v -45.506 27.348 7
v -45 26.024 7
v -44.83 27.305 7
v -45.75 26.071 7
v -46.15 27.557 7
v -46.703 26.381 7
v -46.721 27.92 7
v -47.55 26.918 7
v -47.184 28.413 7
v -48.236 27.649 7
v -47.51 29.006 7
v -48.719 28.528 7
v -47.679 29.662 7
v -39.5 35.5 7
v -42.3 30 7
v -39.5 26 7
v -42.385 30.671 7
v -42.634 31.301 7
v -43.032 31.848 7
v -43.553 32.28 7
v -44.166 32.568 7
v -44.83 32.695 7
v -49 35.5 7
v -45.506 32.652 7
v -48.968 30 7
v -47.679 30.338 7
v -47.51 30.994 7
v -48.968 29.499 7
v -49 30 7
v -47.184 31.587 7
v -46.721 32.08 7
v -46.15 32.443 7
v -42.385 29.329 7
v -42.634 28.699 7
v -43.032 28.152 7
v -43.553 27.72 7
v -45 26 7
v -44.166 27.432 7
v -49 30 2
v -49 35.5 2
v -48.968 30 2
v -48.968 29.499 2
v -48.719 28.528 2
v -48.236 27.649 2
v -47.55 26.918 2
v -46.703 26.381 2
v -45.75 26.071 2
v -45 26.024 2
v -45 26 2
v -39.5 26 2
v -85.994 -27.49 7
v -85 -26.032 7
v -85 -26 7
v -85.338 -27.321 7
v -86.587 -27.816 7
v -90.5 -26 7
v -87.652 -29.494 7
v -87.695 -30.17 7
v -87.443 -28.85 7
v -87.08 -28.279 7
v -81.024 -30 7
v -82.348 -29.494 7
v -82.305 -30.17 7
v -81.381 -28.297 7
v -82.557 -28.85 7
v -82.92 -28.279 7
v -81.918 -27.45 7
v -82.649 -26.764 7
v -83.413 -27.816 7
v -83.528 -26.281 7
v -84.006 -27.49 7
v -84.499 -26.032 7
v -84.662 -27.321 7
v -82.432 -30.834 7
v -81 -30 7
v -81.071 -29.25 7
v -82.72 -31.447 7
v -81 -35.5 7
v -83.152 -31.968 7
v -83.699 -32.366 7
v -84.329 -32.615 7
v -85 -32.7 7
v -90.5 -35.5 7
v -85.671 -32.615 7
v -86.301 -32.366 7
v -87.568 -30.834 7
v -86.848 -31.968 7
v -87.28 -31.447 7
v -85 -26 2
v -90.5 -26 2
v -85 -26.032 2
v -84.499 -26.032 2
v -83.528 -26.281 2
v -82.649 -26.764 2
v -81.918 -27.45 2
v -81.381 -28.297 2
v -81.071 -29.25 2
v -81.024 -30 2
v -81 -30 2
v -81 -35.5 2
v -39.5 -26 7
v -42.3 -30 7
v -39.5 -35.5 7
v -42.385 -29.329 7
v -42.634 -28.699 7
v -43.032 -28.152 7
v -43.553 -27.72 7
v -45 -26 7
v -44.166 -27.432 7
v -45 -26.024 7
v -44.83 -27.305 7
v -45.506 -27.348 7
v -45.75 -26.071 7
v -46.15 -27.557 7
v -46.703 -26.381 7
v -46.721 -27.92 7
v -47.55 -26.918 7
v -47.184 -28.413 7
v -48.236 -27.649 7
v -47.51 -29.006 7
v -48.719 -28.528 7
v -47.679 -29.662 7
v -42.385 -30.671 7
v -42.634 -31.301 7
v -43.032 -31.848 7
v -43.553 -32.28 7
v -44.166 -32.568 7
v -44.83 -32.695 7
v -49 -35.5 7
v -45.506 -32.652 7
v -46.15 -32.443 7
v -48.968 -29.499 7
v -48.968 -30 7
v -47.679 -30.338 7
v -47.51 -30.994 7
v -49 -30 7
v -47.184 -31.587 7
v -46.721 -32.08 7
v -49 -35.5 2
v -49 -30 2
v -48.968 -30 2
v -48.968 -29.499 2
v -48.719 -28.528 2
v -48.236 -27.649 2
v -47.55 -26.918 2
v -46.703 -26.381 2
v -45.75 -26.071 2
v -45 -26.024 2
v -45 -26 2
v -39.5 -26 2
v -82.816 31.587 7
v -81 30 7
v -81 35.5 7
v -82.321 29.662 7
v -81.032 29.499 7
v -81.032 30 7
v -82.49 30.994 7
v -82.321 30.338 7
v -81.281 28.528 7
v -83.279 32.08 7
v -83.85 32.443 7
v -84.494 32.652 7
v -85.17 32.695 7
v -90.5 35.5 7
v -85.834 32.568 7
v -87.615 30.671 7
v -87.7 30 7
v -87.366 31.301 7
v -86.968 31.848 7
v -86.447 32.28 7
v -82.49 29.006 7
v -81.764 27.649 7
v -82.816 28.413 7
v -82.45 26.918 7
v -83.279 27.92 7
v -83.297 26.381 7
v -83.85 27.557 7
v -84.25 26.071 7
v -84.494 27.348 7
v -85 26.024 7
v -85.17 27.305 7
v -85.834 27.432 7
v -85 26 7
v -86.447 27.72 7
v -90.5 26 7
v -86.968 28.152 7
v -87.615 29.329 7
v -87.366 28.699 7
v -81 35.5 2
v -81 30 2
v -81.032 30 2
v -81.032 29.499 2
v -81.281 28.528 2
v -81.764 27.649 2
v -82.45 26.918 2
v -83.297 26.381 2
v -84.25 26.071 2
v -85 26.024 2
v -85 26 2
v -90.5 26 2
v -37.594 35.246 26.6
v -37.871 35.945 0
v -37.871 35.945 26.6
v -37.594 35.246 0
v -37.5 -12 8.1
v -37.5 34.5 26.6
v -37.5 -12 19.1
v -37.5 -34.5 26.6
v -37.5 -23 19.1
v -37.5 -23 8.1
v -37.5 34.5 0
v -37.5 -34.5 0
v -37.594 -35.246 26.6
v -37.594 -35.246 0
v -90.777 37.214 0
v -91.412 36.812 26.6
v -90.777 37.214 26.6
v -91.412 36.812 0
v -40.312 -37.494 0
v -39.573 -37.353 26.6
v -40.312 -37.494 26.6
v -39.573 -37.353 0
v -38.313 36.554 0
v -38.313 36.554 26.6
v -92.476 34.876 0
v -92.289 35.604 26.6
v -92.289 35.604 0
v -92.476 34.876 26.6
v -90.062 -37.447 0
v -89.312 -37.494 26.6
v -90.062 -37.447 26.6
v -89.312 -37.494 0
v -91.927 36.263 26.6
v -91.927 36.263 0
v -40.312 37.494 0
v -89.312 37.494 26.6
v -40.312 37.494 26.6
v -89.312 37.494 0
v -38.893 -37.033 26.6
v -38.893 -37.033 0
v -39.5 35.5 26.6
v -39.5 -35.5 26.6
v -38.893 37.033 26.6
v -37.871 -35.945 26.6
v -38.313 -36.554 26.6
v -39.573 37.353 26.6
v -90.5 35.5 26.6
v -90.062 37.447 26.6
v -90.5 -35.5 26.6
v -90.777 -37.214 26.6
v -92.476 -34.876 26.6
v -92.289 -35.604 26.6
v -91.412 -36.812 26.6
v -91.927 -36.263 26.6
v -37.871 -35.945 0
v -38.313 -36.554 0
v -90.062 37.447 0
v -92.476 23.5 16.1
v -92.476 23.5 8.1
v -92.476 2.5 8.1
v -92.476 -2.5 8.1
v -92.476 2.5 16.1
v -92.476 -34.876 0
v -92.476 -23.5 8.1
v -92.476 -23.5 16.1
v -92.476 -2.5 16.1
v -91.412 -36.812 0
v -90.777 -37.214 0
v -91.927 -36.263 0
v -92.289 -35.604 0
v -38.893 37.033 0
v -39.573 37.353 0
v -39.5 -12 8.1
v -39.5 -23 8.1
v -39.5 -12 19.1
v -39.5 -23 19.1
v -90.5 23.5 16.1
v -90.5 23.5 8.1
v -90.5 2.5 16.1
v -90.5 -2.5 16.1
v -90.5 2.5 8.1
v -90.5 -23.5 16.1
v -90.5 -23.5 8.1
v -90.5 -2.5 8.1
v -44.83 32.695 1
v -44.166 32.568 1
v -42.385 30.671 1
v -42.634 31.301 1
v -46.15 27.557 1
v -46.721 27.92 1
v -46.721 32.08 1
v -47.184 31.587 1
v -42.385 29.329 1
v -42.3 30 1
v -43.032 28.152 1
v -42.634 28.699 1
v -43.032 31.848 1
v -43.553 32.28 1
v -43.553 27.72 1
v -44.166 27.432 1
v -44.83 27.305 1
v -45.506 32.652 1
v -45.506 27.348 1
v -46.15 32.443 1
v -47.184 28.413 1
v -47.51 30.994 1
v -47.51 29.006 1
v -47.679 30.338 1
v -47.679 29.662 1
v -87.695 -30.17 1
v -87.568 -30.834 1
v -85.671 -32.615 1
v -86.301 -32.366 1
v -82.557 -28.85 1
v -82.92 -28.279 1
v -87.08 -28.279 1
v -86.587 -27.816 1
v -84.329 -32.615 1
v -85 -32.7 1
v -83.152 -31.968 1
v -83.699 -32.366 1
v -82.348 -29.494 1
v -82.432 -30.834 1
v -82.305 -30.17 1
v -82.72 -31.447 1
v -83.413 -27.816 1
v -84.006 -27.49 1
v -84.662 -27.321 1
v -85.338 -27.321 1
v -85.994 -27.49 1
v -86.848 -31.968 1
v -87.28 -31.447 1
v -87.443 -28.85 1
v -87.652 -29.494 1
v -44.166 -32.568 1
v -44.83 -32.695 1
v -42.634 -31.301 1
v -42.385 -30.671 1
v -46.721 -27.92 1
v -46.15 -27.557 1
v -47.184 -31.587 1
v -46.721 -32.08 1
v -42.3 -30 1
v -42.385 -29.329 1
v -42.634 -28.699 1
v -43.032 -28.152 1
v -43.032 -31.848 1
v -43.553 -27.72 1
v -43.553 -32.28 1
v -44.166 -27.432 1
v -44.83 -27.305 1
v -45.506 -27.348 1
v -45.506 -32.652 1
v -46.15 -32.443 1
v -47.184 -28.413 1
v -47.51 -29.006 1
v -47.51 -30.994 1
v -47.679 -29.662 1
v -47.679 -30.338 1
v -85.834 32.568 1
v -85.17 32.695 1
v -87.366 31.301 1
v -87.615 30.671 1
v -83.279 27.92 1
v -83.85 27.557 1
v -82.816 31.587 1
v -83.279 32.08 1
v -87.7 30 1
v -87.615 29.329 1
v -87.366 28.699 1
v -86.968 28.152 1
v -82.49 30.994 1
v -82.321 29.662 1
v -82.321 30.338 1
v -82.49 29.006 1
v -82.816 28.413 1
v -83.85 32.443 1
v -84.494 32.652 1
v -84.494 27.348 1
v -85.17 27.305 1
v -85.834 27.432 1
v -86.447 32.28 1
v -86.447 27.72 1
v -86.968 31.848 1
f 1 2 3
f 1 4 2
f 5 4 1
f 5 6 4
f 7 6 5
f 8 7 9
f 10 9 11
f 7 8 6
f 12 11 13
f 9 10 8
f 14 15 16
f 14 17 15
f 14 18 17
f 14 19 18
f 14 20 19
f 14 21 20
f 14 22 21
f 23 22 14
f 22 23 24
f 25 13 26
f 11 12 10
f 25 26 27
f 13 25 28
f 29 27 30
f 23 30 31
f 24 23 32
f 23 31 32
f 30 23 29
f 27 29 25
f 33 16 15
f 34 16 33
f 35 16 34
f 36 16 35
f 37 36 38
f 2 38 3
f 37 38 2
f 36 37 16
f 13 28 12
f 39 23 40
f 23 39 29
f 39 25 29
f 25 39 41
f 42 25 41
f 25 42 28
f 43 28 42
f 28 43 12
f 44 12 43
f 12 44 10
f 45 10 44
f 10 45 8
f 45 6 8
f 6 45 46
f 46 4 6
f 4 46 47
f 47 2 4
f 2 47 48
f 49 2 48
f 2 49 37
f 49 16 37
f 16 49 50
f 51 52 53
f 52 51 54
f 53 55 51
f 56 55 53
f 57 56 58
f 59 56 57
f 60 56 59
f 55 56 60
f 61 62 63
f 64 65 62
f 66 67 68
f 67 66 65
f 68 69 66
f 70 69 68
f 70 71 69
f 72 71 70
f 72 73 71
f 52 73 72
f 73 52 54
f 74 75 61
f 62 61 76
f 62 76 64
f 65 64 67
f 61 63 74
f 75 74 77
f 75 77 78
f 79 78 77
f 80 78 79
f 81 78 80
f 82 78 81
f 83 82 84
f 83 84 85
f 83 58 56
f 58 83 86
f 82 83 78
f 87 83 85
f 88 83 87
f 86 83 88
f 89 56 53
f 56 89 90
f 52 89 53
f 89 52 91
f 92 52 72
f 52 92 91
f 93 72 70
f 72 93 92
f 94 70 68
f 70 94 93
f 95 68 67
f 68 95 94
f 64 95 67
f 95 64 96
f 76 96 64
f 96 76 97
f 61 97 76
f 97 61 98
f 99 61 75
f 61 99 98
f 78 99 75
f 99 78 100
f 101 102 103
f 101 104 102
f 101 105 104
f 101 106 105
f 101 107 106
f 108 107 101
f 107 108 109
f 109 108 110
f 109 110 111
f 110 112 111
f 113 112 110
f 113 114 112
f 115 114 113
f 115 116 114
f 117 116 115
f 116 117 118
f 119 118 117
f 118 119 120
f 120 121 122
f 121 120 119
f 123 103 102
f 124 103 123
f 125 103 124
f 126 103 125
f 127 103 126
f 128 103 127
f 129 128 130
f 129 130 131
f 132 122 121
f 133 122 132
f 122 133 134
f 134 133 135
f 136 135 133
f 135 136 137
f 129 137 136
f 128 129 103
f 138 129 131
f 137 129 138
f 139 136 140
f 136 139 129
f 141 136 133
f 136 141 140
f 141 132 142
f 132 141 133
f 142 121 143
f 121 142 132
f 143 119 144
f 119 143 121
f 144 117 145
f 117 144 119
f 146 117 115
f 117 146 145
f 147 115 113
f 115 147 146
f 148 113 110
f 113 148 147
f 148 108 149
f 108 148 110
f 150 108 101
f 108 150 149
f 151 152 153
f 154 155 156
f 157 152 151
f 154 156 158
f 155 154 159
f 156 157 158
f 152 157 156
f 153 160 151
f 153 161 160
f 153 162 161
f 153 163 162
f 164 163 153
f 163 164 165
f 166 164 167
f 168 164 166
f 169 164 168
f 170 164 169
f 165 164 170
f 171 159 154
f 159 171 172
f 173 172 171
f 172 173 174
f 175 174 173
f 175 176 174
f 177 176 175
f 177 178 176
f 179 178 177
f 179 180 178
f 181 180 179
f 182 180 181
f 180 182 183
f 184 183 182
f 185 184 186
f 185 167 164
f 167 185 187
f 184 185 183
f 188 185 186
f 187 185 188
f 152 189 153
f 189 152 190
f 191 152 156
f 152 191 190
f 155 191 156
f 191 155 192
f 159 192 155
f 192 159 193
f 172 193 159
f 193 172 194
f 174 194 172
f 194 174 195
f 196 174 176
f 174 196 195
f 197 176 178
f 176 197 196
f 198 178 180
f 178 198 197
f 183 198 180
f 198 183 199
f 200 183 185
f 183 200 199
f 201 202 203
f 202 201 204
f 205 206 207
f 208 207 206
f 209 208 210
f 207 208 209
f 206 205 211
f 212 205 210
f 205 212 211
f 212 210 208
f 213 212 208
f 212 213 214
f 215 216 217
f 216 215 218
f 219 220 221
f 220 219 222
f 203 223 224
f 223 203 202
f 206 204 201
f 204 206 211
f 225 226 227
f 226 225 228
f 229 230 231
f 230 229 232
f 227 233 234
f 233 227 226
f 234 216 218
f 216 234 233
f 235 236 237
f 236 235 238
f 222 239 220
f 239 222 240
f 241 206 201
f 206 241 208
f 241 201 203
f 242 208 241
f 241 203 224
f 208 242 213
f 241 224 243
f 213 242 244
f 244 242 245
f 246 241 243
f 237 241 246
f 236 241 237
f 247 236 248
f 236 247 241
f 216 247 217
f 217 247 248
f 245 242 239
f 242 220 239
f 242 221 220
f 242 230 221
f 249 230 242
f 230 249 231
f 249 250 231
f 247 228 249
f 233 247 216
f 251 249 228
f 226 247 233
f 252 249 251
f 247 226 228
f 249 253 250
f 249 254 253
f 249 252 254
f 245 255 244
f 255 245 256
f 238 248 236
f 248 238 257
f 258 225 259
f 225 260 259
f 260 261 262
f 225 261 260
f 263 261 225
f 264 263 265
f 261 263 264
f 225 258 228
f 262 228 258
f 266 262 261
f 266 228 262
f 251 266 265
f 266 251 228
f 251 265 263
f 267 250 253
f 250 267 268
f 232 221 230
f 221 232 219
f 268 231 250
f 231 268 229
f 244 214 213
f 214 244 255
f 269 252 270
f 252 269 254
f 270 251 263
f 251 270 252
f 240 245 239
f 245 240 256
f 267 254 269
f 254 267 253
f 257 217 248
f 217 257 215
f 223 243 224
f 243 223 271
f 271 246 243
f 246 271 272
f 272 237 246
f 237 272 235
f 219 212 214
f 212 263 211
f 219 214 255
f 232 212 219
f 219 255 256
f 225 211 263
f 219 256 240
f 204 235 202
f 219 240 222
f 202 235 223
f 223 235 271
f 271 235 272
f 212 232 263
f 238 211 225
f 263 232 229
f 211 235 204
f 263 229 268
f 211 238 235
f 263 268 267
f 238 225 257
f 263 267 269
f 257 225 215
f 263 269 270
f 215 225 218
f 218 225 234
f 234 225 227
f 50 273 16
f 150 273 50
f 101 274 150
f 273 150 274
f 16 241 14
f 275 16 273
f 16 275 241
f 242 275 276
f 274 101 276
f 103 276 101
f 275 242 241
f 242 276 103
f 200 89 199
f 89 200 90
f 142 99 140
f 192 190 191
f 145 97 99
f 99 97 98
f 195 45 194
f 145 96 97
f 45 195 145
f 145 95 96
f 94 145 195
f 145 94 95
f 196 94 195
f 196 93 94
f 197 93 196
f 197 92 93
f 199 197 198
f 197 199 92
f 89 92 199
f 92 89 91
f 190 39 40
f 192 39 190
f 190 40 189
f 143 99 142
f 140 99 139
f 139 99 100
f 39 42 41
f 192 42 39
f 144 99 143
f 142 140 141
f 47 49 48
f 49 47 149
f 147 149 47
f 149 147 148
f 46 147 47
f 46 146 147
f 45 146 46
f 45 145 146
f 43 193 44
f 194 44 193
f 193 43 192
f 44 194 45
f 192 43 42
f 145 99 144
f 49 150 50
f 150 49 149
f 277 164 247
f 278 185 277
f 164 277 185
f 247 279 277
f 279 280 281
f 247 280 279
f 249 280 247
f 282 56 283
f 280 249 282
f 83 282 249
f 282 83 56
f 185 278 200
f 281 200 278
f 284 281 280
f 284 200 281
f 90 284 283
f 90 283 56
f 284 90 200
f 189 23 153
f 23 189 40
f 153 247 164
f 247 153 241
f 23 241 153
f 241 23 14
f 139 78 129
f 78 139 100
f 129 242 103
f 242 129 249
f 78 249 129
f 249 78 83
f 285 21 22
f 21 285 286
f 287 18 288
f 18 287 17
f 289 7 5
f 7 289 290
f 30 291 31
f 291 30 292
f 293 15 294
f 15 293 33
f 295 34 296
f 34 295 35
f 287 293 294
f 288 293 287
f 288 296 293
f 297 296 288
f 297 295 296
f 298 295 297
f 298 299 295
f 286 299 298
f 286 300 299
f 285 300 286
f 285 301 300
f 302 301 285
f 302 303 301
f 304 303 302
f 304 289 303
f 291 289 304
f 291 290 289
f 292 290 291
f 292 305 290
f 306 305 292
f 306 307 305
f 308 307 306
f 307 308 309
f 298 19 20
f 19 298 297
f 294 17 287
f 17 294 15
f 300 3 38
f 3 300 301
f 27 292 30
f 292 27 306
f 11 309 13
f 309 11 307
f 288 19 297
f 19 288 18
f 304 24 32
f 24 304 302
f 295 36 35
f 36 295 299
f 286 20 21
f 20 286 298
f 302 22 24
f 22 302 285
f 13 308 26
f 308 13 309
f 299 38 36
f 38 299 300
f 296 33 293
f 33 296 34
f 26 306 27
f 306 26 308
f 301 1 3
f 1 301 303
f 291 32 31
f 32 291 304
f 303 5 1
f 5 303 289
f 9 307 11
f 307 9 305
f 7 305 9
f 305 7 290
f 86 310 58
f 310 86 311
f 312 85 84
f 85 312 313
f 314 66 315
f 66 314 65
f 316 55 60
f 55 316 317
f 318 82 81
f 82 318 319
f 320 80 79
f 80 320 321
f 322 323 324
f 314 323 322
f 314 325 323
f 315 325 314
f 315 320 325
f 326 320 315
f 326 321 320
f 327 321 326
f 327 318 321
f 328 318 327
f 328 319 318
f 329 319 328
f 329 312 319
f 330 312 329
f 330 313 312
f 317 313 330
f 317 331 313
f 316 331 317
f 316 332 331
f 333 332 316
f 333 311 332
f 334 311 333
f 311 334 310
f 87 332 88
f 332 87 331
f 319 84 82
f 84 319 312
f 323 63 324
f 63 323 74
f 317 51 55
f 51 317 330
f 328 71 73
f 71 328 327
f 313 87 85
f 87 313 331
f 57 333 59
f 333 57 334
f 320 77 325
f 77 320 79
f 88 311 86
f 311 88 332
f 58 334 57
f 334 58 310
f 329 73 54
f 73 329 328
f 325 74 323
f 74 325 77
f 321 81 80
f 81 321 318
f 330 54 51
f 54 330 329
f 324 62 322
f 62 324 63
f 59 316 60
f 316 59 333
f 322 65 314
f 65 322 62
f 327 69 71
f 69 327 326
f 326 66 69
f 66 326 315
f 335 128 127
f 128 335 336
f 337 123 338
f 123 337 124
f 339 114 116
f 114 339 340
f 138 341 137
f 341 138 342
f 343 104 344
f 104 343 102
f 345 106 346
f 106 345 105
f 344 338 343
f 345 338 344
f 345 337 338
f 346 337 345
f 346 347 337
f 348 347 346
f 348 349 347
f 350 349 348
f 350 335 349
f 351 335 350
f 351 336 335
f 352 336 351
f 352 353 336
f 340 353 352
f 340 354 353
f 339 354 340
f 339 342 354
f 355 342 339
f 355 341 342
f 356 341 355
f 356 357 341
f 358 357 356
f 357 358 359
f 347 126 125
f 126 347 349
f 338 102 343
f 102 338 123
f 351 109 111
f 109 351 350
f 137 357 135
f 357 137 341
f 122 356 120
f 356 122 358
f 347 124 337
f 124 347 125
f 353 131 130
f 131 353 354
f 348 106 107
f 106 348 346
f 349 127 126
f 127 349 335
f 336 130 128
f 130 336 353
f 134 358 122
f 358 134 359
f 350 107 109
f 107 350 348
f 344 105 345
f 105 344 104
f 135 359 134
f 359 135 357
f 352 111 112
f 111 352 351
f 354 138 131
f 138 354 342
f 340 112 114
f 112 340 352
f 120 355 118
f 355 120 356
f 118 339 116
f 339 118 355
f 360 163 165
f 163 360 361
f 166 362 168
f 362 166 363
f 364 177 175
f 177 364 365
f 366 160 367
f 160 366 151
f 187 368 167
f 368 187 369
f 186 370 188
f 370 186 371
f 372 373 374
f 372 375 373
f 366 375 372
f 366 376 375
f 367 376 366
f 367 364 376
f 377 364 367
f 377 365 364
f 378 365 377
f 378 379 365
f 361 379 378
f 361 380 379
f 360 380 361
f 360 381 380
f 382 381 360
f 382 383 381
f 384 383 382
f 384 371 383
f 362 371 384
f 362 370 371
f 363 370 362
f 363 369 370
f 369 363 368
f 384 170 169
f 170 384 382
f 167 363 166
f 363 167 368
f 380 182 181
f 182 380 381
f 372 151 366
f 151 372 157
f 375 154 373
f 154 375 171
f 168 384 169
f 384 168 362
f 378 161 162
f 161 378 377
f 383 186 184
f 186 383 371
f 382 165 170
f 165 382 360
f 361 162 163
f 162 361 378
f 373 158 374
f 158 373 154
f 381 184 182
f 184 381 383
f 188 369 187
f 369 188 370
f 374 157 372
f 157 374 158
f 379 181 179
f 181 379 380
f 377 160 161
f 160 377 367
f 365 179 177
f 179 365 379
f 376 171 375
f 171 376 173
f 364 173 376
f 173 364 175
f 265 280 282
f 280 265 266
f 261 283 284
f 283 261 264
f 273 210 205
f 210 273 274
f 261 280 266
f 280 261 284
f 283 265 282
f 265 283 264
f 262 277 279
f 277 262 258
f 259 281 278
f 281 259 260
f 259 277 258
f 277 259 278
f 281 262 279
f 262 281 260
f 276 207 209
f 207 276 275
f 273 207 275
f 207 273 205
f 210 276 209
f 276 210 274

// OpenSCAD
/* A small, arbitrary unit to guard against rounding errors */
eps = 0.1;
alot = 1000;

/* Base PCB size */
pcb_width = 50;
pcb_height = 70;
/* Extra space around PCB */
pcb_extra = 1;

/* Offset of screw hole centers from left/right/top/bottom side of board */
screw_offx_l = 5;
screw_offx_r = 5;
screw_offx_t = 5;
screw_offx_b = 5;

/* Thickness of bottom, walls, lid (middle sections) */
bottom_thickness = 2;
wall_thickness = 2;
lid_thickness = 2;

/* Outside corner radius */
corner_radius_wall = 3;
corner_radius_lid = 2;

screw_base_dia = 8;
screw_base_h = 5;
screw_nut_dia = 5.4;
screw_nut_h = 6;
screw_hole_dia = 3.2;
screw_hole_h = 6;
board_thickness = 1.6;
height_above_board = 18;
height_lid_inner = 2;
lid_lip_depth = 2;
lid_lip_width = 2;
lid_lip_extra = 1;

clamp_tube_dia = screw_base_dia;
clamp_tube_h = 0; //height_above_board+height_lid_inner;
clamp_tube_base_extra = 2;

screw_head_hole_dia = 6.5;
screw_head_hole_depth = 3;

module rounded_rect(w, h, r) {
    hull(){
        translate([w/2-r, h/2-r]) circle(r);
        translate([-(w/2-r), h/2-r]) circle(r);
        translate([w/2-r, -(h/2-r)]) circle(r);
        translate([-(w/2-r), -(h/2-r)]) circle(r);
    }
}

module shell(thickness, inner_height, inner_extra, radius_horiz) {
    d = thickness + inner_height;
    rh=radius_horiz;
    difference(){
        r = corner_radius_wall;
        w = pcb_width+pcb_extra+2*wall_thickness;
        h = pcb_height+pcb_extra+2*wall_thickness;
        hull() {
            translate([0, 0, rh]) linear_extrude(height=d-rh) rounded_rect(w, h, r);
            linear_extrude(height=eps) rounded_rect(w-2*rh, h-2*rh, r);
        }
        
        iw = pcb_width+inner_extra;
        ih = pcb_height+inner_extra;
        translate([-iw/2, -ih/2, bottom_thickness]) cube([iw, ih, h]);
    }
}

module single_screw_base() {
    translate([0, 0, bottom_thickness-eps]) linear_extrude(height=screw_base_h+eps) {
        circle(d=screw_base_dia);
        translate([-screw_base_dia/2, 0]) square([alot, alot]);
        translate([0, -screw_base_dia/2]) square([alot, alot]);
    }
}

w = pcb_width;
h = pcb_height;
e = pcb_extra;
l = screw_offx_l;
r = screw_offx_r;
t = screw_offx_t;
b = screw_offx_b;
s1_pos = [w/2-l, h/2-b];
s2_pos = [-w/2+r, -h/2+t];
s3_pos = [w/2-l, -h/2+t];
s4_pos = [-w/2+r, h/2-b];
module screw_bases() {
    intersection() {
        union() {
            translate(s1_pos) single_screw_base();
            translate(s2_pos) mirror([1,1,0]) single_screw_base();
            translate(s3_pos) mirror([0,1,0]) single_screw_base();
            translate(s4_pos) mirror([1,0,0]) single_screw_base();
        }
        cube([w+e+eps, h+e+eps, alot], center=true);
    }
}

module single_screw_hole() {
    translate([0, 0, bottom_thickness+screw_base_h+eps])
    mirror([0,0,1])
    union() {
        cylinder(h=screw_nut_h+eps, d=screw_nut_dia);
        cylinder(h=screw_hole_h+eps, d=screw_hole_dia);
    }
}

module screw_holes() {
    translate(s1_pos) single_screw_hole();
    translate(s2_pos) mirror([1,1,0]) single_screw_hole();
    translate(s3_pos) mirror([0,1,0]) single_screw_hole();
    translate(s4_pos) mirror([1,0,0]) single_screw_hole();
}

conn_1_y = 12.0;
conn_1_l = 20.0;
conn_1_h = 7;
conn_2_y =  conn_1_y+conn_1_l+6.0;
conn_2_l = conn_1_l;
conn_2_h = conn_1_h;
conn_pwr_y = 12.5;
conn_pwr_l = 10.0;
conn_pwr_h = 10;
conn_extra = 1;
module conn_holes() {
    e = conn_extra;
    translate([0, -e/2, -e/2])
    translate([0, 0, bottom_thickness+screw_base_h+board_thickness])
    translate([-pcb_width/2, -pcb_height/2]) {
        translate([-alot, conn_1_y]) cube([alot, conn_1_l+e, conn_1_h+e]);
        translate([-alot, conn_2_y]) cube([alot, conn_2_l+e, conn_2_h+e]);
        translate([0, conn_pwr_y]) cube([alot, conn_pwr_l+e, conn_pwr_h+e]);
    }
}

module base() {
    difference() {
        union() {
            screw_bases();
            shell(bottom_thickness,
                screw_base_h + board_thickness + height_above_board,
                pcb_extra,
                radius_horiz=0);
        }
        screw_holes();
        conn_holes();
    }
}

module single_clamp_stud_part(liph, clamp_tube_h, extra) {
    translate([0, 0, lid_thickness-eps]) union() {
        cylinder(h=clamp_tube_h, d=clamp_tube_dia+extra);
        linear_extrude(height=liph+eps) {
            translate([-clamp_tube_dia/2-extra/2, 0]) square([alot, alot]);
            translate([0, -clamp_tube_dia/2-extra/2]) square([alot, alot]);
        }
    }
}

module single_clamp_stud(liph) {
    e = clamp_tube_base_extra;
    single_clamp_stud_part(liph, liph+eps, e);
    single_clamp_stud_part(liph, clamp_tube_h, 0);
}

module lid_screw_hole() {
    cylinder(h=alot, d=screw_hole_dia);
    cylinder(h=screw_head_hole_depth+eps, d=screw_head_hole_dia);
}

module lid() {
    e = lid_lip_extra;
    iw = pcb_width+pcb_extra-e+eps;
    ih = pcb_height+pcb_extra-e+eps;
    liph = lid_lip_depth+height_lid_inner;
    difference() {
        union() {
            shell(lid_thickness,
                height_lid_inner,
                inner_extra=-eps,
                radius_horiz=corner_radius_lid);
            difference() {
                translate([-iw/2, -ih/2, lid_thickness-eps]) cube([iw, ih, liph+eps]);
                // FIXME translate([-iw/2+e/2, -ih/2+e/2, lid_thickness-eps]) cube([iw-e, ih-e, liph+2*eps]);
            }
            intersection() {
                translate([-iw/2, -ih/2, lid_thickness-eps]) cube([iw, ih, alot]);
                union() {
                    translate(s1_pos) single_clamp_stud(liph);
                    translate(s2_pos) mirror([1,1,0]) single_clamp_stud(liph);
                    translate(s3_pos) mirror([0,1,0]) single_clamp_stud(liph);
                    translate(s4_pos) mirror([1,0,0]) single_clamp_stud(liph);
                }
            }
        }
        translate([0, 0, -eps]) {
            translate(s1_pos) lid_screw_hole();
            translate(s2_pos) lid_screw_hole();
            translate(s3_pos) lid_screw_hole();
            translate(s4_pos) lid_screw_hole();
        }
    }
}

module enclosure() {


    intersection() {
        //translate([-pcb_width, -40, 0]) cube (35, 20, 20);
        translate([-pcb_width-15, 0, 0]) base();
    };

/*
    intersection() {
        //translate([-alot/2, -10, -alot/2]) cube ([alot, 20, alot]);
        union () {
            render()    lid();
            render() translate([0,0,eps]) mirror([0,0,1]) intersection() {
                translate([-alot/2, -alot/2, 0]) cube([alot, alot, alot]);
                translate([0,0,-0.2]) scale([0.3, 0.3, 0.04]) surface("depthmap_03.png", center=true);
            };
        };
    };
*/
}

enclosure($fn=25);
